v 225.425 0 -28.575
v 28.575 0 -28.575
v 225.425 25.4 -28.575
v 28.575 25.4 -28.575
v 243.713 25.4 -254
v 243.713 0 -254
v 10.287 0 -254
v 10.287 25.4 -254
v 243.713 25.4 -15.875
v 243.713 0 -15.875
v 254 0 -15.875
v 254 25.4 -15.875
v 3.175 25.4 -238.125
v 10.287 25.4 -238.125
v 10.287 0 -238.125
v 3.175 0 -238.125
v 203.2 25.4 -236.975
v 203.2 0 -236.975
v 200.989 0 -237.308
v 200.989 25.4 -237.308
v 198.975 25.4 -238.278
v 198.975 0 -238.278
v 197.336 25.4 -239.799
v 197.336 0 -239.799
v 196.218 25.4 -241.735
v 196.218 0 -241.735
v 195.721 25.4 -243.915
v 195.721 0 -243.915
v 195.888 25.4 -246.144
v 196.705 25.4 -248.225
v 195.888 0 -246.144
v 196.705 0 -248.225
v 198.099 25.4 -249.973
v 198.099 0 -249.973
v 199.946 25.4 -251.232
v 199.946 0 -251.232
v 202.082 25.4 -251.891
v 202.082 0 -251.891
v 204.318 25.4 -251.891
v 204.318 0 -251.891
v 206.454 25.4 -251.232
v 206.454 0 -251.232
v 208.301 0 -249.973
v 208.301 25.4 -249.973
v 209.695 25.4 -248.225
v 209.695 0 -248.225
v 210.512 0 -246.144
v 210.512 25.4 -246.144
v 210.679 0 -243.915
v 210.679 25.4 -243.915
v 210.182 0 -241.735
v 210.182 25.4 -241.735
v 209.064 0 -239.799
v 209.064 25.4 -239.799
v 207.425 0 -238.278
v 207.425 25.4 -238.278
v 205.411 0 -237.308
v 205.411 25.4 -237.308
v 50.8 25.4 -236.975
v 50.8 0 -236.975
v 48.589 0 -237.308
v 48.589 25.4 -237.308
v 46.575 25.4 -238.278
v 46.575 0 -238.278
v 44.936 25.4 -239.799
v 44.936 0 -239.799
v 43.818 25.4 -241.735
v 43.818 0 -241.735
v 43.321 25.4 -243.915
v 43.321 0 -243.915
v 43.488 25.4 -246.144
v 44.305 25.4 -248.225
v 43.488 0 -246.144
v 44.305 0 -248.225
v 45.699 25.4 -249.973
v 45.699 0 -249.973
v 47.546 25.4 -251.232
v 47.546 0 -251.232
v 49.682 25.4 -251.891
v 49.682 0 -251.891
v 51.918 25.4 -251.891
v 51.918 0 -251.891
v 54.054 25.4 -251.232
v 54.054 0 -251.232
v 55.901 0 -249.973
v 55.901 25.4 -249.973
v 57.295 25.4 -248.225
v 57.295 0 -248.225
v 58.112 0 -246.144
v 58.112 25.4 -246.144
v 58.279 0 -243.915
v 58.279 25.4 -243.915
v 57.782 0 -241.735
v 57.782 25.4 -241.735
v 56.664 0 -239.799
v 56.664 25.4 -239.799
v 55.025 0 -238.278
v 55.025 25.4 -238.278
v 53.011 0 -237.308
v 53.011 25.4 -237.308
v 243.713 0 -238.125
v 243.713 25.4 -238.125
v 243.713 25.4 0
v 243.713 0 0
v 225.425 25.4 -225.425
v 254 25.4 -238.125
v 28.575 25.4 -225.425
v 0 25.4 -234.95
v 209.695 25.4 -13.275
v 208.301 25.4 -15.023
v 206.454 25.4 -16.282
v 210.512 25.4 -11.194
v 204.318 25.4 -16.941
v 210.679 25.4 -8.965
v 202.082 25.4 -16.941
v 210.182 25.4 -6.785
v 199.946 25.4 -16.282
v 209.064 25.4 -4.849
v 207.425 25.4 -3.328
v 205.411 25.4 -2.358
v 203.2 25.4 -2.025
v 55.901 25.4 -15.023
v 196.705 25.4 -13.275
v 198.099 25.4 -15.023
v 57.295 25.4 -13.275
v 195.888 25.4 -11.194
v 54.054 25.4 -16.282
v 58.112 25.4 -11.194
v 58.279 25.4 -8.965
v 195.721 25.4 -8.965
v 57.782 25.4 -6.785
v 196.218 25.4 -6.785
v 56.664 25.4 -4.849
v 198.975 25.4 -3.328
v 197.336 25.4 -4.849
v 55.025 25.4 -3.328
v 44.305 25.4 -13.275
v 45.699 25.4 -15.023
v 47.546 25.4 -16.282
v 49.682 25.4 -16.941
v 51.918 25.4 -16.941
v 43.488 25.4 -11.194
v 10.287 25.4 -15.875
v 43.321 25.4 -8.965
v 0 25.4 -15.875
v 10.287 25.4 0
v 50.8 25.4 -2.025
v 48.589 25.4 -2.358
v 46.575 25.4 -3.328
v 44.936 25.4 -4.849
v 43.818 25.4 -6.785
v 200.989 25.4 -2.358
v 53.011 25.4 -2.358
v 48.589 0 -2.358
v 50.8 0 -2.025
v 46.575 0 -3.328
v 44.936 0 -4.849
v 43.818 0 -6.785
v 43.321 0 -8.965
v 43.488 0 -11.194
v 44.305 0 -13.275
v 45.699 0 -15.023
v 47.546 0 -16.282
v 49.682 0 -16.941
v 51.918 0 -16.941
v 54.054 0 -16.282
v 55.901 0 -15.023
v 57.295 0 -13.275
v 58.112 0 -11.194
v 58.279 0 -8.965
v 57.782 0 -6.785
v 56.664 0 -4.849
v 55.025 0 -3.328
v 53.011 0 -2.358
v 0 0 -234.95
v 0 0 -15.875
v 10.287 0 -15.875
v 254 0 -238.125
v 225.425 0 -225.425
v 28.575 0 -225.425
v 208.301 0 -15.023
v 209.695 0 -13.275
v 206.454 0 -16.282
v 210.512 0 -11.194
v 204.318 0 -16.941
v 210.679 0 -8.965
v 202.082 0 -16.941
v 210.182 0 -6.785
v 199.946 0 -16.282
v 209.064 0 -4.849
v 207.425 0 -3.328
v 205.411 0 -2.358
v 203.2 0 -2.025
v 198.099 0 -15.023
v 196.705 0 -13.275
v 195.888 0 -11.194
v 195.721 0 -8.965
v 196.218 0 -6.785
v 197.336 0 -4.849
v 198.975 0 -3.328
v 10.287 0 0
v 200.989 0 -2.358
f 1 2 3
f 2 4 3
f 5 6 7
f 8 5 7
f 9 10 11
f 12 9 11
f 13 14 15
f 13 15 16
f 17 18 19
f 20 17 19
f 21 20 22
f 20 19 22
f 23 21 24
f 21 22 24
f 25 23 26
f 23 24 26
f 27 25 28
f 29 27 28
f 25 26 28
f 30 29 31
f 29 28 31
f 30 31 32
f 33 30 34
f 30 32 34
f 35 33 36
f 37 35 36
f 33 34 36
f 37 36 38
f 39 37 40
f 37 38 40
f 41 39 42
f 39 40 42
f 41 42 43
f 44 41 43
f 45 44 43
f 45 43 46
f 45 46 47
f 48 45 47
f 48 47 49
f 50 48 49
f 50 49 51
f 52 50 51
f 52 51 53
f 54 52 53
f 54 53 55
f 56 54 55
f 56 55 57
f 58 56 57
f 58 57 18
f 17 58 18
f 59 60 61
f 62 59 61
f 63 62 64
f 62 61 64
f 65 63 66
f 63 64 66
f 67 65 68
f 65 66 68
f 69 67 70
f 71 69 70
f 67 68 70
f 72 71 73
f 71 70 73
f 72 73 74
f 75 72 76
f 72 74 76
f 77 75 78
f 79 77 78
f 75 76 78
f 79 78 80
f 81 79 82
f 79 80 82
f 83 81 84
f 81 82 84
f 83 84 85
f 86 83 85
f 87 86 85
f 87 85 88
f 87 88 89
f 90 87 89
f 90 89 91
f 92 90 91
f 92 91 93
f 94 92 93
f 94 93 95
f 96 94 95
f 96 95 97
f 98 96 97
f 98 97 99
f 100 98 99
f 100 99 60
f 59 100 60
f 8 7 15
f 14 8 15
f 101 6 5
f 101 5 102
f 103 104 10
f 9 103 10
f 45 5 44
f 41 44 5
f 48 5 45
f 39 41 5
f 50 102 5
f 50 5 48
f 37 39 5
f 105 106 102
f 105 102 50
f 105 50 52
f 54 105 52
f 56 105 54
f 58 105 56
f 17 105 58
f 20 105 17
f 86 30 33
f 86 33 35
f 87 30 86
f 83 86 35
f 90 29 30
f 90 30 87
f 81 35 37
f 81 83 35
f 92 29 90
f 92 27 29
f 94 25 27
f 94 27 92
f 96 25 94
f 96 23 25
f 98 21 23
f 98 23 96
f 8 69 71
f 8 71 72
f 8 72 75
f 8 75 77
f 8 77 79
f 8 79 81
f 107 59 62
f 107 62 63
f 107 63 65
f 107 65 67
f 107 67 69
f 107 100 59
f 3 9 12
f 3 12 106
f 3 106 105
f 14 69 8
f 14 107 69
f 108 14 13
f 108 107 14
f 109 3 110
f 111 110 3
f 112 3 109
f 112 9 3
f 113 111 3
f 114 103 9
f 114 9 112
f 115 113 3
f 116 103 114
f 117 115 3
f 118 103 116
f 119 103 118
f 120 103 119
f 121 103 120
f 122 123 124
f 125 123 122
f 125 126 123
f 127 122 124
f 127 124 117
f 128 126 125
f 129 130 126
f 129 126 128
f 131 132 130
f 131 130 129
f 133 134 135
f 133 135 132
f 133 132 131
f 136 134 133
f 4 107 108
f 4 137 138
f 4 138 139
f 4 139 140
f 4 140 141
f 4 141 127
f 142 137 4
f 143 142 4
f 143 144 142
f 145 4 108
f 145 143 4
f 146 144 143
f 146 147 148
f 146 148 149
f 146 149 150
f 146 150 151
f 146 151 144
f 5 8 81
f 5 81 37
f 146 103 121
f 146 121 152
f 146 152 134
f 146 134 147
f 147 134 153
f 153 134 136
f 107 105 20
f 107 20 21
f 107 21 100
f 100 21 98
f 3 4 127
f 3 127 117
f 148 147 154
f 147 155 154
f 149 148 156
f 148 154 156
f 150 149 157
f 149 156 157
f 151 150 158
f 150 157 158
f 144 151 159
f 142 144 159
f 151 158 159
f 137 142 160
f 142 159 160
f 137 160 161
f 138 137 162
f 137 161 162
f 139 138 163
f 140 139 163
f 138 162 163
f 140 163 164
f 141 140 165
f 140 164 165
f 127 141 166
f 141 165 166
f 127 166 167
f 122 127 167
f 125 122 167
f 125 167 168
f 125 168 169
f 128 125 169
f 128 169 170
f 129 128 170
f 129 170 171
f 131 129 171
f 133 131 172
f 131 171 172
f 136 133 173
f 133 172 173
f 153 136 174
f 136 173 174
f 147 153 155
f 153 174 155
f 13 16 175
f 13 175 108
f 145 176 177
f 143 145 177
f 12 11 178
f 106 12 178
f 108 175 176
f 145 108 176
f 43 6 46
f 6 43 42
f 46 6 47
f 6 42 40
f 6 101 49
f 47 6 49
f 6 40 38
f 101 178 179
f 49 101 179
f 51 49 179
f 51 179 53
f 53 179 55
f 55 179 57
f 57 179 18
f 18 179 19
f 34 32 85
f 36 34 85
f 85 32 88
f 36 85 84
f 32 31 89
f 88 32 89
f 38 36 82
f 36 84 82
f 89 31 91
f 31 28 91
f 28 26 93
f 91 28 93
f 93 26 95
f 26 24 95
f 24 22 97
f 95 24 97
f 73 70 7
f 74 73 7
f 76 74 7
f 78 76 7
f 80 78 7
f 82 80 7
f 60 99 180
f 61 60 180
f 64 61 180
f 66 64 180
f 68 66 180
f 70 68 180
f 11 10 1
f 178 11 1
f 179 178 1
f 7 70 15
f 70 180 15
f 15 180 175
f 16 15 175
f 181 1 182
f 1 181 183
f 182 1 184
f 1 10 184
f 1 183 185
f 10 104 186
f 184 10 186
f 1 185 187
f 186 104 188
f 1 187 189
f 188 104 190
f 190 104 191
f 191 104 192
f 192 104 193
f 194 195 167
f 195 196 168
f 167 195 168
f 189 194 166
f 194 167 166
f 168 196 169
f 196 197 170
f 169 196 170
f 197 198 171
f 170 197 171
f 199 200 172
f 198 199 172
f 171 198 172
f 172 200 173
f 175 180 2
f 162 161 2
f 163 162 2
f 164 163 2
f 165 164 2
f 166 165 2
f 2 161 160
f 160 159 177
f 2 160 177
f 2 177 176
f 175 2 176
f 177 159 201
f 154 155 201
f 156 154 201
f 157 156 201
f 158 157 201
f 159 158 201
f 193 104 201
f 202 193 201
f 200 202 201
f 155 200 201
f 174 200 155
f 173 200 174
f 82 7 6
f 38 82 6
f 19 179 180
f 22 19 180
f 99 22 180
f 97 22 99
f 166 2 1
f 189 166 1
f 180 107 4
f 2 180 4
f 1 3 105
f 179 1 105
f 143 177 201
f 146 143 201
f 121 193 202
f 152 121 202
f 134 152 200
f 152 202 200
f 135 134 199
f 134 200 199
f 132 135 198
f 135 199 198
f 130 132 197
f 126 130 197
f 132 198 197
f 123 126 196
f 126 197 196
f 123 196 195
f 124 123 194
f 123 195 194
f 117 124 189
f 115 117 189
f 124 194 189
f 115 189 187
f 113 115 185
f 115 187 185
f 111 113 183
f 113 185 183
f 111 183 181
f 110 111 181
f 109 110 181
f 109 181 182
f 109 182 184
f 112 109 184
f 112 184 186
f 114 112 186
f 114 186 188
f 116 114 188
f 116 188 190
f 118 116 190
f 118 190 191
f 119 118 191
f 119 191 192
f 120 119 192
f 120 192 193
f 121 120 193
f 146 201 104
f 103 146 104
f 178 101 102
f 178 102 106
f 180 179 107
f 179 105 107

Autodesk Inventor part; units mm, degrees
ref_plane "YZ Plane" through (0, 0, 0) normal (1, 0, 0) x (0, 1, 0)
ref_plane "XZ Plane" through (0, 0, 0) normal (0, 1, 0) x (-1, 0, 0)
ref_plane "XY Plane" through (0, 0, 0) normal (0, 0, 1) x (1, 0, 0)
sketch "Sketch1" plane through (0, 0, 0) normal (0, 1, 0) x (-1, 0, 0)
  line L0 (0, 0) -> (-254, 0)
  line L1 (-254, 0) -> (-254, -254)
  line L2 (-254, -254) -> (0, -254)
  line L3 (0, -254) -> (0, 0)
  line L4 (0, -15.875) -> (-10.287, -15.875)
  line L5 (-10.287, -15.875) -> (-10.287, 0)
  line L6 (-243.713, 0) -> (-243.713, -15.875)
  line L7 (-243.713, -15.875) -> (-254, -15.875)
  line L8 (-243.713, -254) -> (-243.713, -238.125)
  line L9 (-243.713, -238.125) -> (-254, -238.125)
  line L10 (-10.287, -254) -> (-10.287, -238.125)
  line L11 (-10.287, -238.125) -> (0, -238.125)
  dimension "d0" = 254
  dimension "d1" = 254
  dimension "d13" = 10.287
  dimension "d14" = 10.287
  dimension "d15" = 15.875
  dimension "d16" = 15.875
extrude "Extrusion1" add sketch "Sketch1" along normal blind 25.4 contours L5 L4 L3 L11 L10 L2 L8 L9 L1 L7 L6 L0
sketch "Sketch2" plane through (0, 25.4, 0) normal (0, 1, 0) x (1, 0, 0)
  line L0 (28.575, 28.575) -> (225.425, 28.575)
  line L1 (225.425, 28.575) -> (225.425, 225.425)
  line L2 (225.425, 225.425) -> (28.575, 225.425)
  line L3 (28.575, 225.425) -> (28.575, 28.575)
  line L4 (0, 15.875) -> (10.287, 15.875) projected
  line L5 (10.287, 15.875) -> (10.287, 0) projected
  line L6 (10.287, 0) -> (243.713, 0) projected
  line L7 (243.713, 0) -> (243.713, 15.875) projected
  line L8 (243.713, 15.875) -> (254, 15.875) projected
  line L9 (254, 15.875) -> (254, 238.125) projected
  line L10 (254, 238.125) -> (243.713, 238.125) projected
  line L11 (243.713, 238.125) -> (243.713, 254) projected
  line L12 (243.713, 254) -> (10.287, 254) projected
  line L13 (10.287, 254) -> (10.287, 238.125) projected
  line L14 (10.287, 238.125) -> (0, 238.125) projected
  line L15 (0, 238.125) -> (0, 15.875) projected
  point P0 (0, 0)
  point P1 (127, 28.575)
  point P2 (127, 0)
  point P3 (28.575, 127)
  point P4 (0, 127)
  dimension "d9" = 196.85
  dimension "d10" = 196.85
extrude "Extrusion2" cut sketch "Sketch2" against normal through all contours L3 L2 L1 L0
sketch "Sketch3" plane through (0, 25.4, 0) normal (0, 1, 0) x (1, 0, 0)
  circle A0 centre (50.8, 9.525) radius 7.5 projected
  circle A1 centre (50.8, 244.475) radius 7.5 projected
  circle A2 centre (203.2, 244.475) radius 4 projected
  circle A3 centre (203.2, 244.475) radius 7.5 projected
  circle A4 centre (203.2, 9.525) radius 7.5 projected
  point P0 (0, 0)
hole "Hole1" at (50.8, 25.4, -9.525) at (50.8, 25.4, -244.475) at (203.2, 25.4, -9.525) at (203.2, 25.4, -244.475) direction (0, -1, 0) diameter 15 end through all
chamfer "Chamfer1" distance 3.175 angle 45 1 edges at (0, 12.7, -238.125)
equation "\"d14\" = d13"
equation "\"d9\" = d10"
properties part number "Carriage Sheet"
